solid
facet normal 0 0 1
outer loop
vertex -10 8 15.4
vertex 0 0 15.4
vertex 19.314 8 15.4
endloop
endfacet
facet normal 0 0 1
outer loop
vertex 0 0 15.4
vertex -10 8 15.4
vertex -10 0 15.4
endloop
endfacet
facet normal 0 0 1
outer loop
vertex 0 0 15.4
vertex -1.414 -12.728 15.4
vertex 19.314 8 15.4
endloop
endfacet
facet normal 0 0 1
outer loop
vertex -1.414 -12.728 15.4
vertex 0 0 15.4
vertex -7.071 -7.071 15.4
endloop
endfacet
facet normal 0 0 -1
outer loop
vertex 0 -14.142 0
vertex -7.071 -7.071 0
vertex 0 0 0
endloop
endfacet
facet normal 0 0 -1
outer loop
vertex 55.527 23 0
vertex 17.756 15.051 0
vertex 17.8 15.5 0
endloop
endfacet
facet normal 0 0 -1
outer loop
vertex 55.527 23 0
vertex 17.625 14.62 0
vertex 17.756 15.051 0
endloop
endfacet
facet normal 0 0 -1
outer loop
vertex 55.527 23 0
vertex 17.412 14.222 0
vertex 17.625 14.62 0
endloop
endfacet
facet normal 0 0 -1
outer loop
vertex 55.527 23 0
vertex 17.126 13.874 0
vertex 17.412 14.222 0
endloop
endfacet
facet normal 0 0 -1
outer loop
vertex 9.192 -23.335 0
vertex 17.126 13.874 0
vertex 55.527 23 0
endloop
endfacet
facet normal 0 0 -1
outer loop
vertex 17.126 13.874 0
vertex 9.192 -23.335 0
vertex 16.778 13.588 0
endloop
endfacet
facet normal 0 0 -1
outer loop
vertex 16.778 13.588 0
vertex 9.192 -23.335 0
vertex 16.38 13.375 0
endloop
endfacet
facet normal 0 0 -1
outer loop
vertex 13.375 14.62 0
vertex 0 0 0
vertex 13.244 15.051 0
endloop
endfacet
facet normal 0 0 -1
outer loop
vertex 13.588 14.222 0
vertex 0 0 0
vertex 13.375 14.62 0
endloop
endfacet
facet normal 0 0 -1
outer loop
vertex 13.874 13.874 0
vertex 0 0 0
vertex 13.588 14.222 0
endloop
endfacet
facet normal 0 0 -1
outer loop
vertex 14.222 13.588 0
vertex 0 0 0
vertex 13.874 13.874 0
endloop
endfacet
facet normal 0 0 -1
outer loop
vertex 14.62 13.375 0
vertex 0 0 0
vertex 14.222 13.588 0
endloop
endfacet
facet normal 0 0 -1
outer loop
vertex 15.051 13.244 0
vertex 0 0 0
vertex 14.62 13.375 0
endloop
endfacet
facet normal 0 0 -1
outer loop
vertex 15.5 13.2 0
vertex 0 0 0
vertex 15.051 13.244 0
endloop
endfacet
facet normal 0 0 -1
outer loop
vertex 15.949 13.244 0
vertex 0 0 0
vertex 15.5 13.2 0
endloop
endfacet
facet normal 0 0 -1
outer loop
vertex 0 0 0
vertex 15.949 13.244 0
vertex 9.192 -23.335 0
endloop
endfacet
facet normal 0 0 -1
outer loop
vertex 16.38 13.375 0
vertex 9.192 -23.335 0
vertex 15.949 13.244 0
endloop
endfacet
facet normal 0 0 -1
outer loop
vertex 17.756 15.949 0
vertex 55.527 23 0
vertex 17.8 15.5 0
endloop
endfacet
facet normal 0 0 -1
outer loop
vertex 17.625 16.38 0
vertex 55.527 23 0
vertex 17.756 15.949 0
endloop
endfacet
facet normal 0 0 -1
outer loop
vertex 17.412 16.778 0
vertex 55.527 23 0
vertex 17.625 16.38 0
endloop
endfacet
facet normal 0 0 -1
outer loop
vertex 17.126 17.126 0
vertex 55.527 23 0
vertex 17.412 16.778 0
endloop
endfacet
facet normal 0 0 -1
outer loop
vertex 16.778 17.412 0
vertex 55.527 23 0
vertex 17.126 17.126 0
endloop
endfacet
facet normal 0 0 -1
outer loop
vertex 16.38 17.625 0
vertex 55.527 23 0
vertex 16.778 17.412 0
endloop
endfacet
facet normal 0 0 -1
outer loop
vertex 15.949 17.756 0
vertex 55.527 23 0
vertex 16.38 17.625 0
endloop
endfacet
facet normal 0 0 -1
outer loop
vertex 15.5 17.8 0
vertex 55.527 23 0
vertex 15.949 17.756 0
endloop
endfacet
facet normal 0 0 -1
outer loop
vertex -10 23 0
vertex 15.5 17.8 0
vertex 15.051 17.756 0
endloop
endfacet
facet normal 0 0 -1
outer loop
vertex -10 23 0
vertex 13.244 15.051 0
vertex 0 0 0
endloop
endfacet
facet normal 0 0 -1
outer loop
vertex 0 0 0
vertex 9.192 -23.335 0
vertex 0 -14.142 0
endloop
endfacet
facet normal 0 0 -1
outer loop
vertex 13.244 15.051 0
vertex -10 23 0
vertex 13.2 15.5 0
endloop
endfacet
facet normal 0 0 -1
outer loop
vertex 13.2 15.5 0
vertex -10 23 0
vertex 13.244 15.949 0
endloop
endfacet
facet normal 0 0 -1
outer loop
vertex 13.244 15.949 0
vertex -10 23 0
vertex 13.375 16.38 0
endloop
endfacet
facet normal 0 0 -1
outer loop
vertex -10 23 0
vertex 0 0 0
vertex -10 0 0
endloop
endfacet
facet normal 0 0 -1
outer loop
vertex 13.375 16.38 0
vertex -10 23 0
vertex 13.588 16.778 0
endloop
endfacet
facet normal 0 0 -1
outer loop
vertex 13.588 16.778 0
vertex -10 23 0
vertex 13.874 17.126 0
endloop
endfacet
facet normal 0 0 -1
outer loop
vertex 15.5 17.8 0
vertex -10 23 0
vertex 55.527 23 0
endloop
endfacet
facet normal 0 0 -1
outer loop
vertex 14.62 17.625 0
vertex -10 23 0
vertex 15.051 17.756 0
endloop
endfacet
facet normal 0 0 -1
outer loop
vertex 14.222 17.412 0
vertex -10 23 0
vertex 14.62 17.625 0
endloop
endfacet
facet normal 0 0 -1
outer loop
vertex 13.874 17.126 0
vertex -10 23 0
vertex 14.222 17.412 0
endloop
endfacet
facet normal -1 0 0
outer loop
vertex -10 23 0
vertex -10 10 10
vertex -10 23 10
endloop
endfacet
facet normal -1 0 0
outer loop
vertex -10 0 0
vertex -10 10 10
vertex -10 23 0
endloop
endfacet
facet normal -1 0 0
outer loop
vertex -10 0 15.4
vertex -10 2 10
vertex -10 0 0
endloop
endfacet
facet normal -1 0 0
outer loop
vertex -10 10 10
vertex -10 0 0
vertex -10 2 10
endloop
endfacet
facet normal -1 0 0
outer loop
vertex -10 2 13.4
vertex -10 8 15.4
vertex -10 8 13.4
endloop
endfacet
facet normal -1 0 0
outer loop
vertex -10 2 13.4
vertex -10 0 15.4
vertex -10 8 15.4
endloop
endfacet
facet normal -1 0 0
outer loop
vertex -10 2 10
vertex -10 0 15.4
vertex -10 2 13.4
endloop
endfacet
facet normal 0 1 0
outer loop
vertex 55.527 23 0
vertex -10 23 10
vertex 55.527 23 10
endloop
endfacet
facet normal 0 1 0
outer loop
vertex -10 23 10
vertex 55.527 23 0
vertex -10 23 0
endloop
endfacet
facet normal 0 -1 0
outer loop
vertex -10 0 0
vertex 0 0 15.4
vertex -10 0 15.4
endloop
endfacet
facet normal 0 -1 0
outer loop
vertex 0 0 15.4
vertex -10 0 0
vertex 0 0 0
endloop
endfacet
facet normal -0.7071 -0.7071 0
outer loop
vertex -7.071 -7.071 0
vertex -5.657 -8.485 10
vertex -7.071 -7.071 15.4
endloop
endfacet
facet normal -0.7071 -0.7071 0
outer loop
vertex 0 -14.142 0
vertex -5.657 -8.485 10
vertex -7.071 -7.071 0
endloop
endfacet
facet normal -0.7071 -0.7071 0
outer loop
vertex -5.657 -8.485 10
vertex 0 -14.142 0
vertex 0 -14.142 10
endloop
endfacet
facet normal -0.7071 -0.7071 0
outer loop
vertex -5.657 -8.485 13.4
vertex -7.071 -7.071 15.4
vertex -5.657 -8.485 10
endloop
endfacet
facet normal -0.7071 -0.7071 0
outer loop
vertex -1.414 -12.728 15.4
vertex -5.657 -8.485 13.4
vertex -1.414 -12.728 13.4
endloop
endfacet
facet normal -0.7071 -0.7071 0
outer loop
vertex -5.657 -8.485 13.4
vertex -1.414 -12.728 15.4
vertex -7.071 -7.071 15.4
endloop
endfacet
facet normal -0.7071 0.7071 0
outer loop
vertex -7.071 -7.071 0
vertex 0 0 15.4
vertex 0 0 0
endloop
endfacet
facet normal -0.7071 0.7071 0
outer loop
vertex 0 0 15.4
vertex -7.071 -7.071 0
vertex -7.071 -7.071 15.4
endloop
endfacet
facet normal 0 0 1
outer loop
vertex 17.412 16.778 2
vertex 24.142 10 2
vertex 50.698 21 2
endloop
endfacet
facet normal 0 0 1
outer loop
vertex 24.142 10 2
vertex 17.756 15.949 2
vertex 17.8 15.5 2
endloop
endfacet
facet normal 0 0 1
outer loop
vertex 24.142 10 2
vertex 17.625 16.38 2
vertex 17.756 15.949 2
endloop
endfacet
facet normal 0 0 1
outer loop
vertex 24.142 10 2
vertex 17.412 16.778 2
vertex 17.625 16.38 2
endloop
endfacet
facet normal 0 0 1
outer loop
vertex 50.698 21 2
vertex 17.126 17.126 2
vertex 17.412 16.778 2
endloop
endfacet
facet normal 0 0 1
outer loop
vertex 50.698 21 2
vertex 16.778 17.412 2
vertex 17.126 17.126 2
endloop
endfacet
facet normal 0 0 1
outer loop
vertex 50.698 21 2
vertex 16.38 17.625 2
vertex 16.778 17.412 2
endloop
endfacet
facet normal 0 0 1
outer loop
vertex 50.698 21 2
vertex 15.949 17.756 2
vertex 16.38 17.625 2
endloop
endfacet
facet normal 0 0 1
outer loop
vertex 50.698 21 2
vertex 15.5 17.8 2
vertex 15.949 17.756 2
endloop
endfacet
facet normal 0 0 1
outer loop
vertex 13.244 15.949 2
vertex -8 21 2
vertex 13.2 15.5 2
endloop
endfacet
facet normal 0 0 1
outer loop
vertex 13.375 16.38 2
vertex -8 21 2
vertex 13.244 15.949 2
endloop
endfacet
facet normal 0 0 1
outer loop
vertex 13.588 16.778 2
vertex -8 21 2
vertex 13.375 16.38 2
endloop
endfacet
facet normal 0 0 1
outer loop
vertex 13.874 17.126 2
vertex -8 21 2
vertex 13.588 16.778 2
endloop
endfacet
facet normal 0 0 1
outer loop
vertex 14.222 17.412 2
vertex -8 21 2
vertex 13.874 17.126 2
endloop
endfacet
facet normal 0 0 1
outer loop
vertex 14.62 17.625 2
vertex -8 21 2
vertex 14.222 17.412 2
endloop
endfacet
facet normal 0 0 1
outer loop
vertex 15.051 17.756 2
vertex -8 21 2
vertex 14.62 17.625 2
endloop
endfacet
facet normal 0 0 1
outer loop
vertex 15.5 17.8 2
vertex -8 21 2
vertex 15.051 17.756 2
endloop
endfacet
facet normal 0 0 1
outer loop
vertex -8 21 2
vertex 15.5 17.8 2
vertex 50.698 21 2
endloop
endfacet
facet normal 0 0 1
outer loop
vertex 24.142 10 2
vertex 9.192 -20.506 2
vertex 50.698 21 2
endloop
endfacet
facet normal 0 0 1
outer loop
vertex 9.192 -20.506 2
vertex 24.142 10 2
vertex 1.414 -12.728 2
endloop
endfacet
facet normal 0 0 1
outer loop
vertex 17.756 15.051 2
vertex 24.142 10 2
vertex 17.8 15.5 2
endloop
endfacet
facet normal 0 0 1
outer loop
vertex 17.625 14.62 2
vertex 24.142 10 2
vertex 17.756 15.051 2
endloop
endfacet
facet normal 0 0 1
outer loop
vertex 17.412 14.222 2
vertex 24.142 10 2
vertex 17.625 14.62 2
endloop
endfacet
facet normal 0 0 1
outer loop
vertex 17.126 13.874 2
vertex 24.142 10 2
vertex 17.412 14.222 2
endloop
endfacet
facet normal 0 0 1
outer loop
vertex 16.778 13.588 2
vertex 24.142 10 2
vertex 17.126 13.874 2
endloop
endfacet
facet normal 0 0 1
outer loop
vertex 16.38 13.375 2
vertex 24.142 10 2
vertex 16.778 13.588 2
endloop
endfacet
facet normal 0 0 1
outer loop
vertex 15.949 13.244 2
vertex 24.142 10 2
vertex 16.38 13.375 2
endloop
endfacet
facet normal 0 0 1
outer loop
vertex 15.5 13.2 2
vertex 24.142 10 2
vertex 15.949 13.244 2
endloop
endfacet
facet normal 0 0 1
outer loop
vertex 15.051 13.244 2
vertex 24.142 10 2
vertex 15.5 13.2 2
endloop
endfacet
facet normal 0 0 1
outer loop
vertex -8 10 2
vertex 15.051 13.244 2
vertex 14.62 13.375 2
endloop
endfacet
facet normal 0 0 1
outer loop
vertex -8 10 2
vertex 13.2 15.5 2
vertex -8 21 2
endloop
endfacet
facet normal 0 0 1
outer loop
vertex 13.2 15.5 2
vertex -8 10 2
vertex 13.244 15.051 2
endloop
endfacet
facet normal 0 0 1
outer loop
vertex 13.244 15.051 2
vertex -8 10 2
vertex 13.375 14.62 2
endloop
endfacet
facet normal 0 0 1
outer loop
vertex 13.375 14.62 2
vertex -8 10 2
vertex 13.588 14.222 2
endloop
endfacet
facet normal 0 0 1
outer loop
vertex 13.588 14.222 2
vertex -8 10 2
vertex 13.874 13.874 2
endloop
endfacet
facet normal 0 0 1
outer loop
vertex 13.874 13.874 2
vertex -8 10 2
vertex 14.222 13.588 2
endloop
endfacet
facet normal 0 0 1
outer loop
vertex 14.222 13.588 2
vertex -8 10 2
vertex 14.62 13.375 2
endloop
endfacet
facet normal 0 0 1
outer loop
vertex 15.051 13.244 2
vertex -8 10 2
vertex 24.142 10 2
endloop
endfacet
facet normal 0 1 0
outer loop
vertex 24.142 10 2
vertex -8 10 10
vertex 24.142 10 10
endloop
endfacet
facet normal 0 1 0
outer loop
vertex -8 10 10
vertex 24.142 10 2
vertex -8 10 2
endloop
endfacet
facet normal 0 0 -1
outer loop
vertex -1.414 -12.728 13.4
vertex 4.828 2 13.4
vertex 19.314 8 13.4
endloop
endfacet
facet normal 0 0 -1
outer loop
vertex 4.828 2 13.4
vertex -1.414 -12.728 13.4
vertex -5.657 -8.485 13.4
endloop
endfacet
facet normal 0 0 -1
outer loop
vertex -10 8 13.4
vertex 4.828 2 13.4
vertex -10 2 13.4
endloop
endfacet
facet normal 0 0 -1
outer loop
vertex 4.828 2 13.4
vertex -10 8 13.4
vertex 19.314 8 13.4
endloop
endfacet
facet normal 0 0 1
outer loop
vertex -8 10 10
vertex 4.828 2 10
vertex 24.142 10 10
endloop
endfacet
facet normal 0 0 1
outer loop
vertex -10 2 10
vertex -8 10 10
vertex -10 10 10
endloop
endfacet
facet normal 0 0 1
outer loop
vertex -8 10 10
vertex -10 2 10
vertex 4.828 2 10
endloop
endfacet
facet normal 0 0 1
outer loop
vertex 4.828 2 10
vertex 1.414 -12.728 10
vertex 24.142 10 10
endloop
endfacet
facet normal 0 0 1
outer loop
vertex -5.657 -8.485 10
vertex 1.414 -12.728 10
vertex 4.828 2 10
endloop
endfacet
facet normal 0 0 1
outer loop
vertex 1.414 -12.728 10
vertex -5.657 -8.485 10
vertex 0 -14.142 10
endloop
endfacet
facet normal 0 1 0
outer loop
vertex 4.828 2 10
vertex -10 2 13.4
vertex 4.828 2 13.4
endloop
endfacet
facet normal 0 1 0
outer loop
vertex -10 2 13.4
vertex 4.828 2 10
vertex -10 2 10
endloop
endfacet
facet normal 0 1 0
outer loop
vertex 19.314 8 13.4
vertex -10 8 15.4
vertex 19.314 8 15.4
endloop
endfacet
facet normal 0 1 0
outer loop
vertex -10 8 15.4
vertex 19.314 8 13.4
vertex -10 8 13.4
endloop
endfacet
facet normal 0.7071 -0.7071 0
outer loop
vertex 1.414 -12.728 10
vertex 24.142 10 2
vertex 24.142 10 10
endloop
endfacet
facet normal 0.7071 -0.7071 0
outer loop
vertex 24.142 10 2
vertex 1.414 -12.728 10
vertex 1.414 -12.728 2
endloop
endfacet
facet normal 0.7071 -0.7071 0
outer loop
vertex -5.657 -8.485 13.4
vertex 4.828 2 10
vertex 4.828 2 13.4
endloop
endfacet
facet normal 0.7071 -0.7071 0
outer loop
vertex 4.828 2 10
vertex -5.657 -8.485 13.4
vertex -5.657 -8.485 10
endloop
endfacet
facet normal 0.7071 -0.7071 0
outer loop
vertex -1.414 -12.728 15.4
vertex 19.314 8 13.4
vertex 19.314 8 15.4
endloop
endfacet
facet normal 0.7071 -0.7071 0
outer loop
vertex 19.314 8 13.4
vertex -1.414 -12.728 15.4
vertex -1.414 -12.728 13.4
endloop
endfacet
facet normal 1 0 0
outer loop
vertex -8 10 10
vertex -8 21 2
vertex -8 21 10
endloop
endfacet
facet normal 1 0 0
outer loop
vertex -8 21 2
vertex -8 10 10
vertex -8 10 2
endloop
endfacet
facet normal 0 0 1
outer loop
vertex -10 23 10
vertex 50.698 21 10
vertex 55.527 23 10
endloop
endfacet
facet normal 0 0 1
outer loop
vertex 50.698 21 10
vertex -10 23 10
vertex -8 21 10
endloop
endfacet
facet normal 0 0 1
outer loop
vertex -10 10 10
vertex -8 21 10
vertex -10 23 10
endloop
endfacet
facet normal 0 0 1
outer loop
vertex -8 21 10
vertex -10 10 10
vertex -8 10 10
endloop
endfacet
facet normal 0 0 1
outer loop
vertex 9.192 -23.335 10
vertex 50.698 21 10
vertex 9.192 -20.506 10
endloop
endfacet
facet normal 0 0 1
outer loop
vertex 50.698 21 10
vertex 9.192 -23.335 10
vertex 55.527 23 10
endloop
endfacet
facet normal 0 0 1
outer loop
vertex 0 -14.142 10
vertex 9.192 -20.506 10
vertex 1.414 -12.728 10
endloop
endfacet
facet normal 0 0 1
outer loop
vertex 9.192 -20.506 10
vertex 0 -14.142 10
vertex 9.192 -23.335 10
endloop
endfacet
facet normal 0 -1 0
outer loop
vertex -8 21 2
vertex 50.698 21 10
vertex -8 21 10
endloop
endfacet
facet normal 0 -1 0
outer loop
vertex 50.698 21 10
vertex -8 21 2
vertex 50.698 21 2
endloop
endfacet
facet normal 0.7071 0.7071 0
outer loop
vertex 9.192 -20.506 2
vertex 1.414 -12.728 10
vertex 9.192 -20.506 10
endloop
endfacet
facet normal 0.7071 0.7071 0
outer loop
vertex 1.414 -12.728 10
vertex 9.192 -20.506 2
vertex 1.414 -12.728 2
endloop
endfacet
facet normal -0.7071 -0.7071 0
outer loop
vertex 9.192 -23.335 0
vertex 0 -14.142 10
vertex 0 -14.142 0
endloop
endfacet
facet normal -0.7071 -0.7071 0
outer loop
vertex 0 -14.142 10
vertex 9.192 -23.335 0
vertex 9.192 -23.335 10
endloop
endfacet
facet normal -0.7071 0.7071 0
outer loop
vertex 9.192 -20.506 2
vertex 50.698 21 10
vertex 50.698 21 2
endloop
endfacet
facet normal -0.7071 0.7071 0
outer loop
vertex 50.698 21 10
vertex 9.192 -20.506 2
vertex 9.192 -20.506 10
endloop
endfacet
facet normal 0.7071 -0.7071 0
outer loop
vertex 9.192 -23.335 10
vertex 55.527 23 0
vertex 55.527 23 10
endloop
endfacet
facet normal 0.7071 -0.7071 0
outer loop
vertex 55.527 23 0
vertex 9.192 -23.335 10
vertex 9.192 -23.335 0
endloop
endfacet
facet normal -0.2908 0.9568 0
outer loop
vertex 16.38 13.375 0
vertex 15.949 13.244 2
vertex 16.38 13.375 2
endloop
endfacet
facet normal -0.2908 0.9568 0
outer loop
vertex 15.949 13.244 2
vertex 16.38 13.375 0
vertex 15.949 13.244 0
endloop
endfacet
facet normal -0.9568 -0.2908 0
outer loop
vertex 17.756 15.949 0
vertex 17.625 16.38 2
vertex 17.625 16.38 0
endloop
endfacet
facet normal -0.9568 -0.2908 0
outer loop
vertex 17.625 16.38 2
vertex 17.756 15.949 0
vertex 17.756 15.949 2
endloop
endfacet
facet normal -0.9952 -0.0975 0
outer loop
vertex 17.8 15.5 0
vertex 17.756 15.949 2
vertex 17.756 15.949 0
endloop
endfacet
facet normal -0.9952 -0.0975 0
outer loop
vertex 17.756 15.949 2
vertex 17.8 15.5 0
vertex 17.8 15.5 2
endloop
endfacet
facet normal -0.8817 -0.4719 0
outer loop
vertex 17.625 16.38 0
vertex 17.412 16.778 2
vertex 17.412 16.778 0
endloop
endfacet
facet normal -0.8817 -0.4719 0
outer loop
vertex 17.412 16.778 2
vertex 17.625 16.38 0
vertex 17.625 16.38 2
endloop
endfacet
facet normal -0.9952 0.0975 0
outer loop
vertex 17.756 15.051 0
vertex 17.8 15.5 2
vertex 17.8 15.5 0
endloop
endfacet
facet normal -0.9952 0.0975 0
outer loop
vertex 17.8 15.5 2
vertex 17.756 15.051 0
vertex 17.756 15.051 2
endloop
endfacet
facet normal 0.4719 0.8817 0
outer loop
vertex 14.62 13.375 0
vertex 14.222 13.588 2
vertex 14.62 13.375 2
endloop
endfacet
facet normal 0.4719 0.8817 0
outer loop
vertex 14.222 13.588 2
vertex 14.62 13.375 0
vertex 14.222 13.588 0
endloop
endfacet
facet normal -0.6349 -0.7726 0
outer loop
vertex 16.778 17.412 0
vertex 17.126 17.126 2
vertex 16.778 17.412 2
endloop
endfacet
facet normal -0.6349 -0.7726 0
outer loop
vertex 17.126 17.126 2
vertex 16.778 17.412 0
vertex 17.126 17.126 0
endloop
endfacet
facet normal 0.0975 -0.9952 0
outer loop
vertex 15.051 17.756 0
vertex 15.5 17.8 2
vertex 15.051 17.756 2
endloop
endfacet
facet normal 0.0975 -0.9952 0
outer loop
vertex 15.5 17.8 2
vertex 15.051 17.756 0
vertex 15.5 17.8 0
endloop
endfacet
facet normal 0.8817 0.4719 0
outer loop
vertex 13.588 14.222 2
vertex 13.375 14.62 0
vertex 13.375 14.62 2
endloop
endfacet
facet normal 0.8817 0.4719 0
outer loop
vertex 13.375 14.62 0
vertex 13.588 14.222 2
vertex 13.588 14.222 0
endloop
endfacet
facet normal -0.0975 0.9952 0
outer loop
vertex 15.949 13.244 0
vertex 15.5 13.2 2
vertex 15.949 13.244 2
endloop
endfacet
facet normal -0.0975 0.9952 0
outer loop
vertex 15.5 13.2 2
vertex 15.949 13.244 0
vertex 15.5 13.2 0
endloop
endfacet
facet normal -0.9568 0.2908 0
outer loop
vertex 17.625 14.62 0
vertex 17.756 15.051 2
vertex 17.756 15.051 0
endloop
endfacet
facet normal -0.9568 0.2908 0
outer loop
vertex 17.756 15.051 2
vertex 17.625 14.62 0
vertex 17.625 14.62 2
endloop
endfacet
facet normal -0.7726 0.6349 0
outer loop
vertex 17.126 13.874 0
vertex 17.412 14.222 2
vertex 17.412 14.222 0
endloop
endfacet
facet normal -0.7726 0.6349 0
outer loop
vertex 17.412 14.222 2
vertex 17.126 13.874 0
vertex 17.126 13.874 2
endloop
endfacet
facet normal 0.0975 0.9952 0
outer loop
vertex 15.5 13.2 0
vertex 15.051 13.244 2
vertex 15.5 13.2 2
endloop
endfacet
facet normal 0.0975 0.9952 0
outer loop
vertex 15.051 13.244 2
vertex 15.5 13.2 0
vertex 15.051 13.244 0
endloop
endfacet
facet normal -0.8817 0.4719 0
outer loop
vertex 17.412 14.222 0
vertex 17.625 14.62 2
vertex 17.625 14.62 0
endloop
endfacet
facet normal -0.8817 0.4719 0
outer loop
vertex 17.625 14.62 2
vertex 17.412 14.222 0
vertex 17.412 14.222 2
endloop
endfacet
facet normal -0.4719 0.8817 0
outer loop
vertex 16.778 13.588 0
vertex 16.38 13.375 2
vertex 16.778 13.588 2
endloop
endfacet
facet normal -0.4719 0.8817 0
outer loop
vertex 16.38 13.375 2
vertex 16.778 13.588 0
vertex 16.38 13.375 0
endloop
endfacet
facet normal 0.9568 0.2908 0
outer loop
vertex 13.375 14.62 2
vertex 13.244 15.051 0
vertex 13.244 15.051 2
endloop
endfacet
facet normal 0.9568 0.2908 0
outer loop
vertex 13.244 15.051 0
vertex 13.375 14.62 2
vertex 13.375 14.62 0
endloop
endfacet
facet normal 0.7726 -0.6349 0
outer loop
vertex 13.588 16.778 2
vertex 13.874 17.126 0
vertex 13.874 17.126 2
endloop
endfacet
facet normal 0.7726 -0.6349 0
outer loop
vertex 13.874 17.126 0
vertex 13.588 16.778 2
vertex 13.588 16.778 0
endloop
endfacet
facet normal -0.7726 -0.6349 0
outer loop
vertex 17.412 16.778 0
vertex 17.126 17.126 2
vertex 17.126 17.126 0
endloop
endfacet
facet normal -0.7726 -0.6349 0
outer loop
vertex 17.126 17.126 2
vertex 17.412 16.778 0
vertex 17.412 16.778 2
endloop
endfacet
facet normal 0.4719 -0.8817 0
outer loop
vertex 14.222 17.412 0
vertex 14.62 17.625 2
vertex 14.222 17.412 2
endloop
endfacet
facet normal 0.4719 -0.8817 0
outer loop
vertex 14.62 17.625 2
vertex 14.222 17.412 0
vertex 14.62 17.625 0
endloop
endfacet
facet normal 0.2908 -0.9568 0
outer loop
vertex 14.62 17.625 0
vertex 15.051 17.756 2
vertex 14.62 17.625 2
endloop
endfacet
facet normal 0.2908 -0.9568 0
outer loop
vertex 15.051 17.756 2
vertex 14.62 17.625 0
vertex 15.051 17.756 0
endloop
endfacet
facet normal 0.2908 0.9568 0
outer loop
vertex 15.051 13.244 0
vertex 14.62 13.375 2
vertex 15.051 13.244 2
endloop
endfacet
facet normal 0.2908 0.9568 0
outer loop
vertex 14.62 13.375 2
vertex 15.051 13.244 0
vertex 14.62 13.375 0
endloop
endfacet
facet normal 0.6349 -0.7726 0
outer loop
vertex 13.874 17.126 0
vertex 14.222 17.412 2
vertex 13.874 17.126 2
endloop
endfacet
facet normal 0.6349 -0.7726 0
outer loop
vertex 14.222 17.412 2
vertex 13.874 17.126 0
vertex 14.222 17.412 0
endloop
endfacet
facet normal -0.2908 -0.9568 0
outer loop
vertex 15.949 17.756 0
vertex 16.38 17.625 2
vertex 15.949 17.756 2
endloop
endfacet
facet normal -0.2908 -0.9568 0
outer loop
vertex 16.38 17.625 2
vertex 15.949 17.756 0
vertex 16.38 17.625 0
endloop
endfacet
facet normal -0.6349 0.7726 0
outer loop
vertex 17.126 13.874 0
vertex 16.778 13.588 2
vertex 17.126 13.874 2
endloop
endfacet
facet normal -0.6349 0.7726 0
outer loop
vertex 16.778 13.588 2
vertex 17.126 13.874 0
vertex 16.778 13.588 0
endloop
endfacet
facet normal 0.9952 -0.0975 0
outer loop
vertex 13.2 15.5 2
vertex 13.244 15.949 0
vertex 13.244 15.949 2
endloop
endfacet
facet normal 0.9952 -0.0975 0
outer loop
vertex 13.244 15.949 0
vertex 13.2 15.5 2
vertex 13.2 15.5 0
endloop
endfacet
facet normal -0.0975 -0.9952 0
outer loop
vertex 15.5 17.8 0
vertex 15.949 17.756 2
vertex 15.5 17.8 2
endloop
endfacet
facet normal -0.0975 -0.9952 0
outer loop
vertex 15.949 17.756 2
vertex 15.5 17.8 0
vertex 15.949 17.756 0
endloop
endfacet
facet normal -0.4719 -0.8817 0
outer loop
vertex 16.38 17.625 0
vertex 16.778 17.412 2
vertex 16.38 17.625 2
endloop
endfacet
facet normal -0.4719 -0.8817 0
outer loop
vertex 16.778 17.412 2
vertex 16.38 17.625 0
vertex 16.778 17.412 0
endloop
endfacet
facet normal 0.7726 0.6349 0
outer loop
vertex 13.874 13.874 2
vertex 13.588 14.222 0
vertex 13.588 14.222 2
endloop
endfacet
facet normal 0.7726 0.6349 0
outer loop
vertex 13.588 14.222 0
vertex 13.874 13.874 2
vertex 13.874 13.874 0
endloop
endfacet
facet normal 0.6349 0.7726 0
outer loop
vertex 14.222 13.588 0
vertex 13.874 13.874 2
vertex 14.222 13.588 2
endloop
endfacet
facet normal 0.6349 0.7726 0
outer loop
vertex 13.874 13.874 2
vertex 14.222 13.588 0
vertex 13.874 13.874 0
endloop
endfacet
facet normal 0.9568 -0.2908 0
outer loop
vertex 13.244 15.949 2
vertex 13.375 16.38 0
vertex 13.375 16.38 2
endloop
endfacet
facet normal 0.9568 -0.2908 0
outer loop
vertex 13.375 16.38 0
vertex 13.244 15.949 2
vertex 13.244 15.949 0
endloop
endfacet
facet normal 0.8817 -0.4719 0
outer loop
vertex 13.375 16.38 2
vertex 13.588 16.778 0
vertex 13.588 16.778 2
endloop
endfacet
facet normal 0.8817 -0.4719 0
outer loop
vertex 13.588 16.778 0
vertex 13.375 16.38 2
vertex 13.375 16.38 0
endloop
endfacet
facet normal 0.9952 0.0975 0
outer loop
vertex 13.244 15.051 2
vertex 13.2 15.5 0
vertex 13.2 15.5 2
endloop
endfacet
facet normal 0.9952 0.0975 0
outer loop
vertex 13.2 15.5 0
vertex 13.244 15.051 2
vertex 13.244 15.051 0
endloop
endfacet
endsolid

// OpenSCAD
$fn=32;
angle = 45;
channel_width = 13;
overhang = 8;
width = 10;
thickness = 2;
wall_thickness = 2;
box_thickness = 10;
bottom_thickness = 3.4;
screw_hole_radius = 2.3;

difference() {
  union() {
    difference() {
      union() {
        positive1();
        rotate(a=angle, axis=[0,0,1])
        mirror([0,1,0])
        positive1();
      }
      negative1();
      rotate(a=angle, axis=[0,0,1])
      mirror([0,1,0])
      negative1();
    }
    positive2();
    rotate(a=angle, axis=[0,0,1])
    mirror([0,1,0])
    positive2();
  }
  negative2();
  rotate(a=angle, axis=[0,0,1])
  mirror([0,1,0])
  negative2();

  y = (overhang + wall_thickness + channel_width/2 - thickness/2);
  x = y * tan(angle);
  translate([x, y, -1])
  cylinder(h=thickness+2, r=screw_hole_radius);
}


module positive1() {
  translate([-width,0,0])
  cube([100, overhang + wall_thickness + channel_width, box_thickness + bottom_thickness + thickness]);
}

module negative1() {
  translate([-100, overhang + wall_thickness, thickness])
  cube([300, 100, box_thickness]);

  translate([-100, thickness, box_thickness])
  cube([300, 100, bottom_thickness]);

  translate([-100, overhang, box_thickness])
  cube([300, 100, 100]);
}

module positive2() {
  translate([-width, overhang + wall_thickness, 0])
  cube([thickness, channel_width, box_thickness]);

  translate([-width, overhang + wall_thickness + channel_width - thickness, 0])
  cube([100, thickness, box_thickness]);
}

module negative2() {
  translate([-100, overhang + wall_thickness + channel_width, -1])
  cube([300, 100, box_thickness + 2]);
}
